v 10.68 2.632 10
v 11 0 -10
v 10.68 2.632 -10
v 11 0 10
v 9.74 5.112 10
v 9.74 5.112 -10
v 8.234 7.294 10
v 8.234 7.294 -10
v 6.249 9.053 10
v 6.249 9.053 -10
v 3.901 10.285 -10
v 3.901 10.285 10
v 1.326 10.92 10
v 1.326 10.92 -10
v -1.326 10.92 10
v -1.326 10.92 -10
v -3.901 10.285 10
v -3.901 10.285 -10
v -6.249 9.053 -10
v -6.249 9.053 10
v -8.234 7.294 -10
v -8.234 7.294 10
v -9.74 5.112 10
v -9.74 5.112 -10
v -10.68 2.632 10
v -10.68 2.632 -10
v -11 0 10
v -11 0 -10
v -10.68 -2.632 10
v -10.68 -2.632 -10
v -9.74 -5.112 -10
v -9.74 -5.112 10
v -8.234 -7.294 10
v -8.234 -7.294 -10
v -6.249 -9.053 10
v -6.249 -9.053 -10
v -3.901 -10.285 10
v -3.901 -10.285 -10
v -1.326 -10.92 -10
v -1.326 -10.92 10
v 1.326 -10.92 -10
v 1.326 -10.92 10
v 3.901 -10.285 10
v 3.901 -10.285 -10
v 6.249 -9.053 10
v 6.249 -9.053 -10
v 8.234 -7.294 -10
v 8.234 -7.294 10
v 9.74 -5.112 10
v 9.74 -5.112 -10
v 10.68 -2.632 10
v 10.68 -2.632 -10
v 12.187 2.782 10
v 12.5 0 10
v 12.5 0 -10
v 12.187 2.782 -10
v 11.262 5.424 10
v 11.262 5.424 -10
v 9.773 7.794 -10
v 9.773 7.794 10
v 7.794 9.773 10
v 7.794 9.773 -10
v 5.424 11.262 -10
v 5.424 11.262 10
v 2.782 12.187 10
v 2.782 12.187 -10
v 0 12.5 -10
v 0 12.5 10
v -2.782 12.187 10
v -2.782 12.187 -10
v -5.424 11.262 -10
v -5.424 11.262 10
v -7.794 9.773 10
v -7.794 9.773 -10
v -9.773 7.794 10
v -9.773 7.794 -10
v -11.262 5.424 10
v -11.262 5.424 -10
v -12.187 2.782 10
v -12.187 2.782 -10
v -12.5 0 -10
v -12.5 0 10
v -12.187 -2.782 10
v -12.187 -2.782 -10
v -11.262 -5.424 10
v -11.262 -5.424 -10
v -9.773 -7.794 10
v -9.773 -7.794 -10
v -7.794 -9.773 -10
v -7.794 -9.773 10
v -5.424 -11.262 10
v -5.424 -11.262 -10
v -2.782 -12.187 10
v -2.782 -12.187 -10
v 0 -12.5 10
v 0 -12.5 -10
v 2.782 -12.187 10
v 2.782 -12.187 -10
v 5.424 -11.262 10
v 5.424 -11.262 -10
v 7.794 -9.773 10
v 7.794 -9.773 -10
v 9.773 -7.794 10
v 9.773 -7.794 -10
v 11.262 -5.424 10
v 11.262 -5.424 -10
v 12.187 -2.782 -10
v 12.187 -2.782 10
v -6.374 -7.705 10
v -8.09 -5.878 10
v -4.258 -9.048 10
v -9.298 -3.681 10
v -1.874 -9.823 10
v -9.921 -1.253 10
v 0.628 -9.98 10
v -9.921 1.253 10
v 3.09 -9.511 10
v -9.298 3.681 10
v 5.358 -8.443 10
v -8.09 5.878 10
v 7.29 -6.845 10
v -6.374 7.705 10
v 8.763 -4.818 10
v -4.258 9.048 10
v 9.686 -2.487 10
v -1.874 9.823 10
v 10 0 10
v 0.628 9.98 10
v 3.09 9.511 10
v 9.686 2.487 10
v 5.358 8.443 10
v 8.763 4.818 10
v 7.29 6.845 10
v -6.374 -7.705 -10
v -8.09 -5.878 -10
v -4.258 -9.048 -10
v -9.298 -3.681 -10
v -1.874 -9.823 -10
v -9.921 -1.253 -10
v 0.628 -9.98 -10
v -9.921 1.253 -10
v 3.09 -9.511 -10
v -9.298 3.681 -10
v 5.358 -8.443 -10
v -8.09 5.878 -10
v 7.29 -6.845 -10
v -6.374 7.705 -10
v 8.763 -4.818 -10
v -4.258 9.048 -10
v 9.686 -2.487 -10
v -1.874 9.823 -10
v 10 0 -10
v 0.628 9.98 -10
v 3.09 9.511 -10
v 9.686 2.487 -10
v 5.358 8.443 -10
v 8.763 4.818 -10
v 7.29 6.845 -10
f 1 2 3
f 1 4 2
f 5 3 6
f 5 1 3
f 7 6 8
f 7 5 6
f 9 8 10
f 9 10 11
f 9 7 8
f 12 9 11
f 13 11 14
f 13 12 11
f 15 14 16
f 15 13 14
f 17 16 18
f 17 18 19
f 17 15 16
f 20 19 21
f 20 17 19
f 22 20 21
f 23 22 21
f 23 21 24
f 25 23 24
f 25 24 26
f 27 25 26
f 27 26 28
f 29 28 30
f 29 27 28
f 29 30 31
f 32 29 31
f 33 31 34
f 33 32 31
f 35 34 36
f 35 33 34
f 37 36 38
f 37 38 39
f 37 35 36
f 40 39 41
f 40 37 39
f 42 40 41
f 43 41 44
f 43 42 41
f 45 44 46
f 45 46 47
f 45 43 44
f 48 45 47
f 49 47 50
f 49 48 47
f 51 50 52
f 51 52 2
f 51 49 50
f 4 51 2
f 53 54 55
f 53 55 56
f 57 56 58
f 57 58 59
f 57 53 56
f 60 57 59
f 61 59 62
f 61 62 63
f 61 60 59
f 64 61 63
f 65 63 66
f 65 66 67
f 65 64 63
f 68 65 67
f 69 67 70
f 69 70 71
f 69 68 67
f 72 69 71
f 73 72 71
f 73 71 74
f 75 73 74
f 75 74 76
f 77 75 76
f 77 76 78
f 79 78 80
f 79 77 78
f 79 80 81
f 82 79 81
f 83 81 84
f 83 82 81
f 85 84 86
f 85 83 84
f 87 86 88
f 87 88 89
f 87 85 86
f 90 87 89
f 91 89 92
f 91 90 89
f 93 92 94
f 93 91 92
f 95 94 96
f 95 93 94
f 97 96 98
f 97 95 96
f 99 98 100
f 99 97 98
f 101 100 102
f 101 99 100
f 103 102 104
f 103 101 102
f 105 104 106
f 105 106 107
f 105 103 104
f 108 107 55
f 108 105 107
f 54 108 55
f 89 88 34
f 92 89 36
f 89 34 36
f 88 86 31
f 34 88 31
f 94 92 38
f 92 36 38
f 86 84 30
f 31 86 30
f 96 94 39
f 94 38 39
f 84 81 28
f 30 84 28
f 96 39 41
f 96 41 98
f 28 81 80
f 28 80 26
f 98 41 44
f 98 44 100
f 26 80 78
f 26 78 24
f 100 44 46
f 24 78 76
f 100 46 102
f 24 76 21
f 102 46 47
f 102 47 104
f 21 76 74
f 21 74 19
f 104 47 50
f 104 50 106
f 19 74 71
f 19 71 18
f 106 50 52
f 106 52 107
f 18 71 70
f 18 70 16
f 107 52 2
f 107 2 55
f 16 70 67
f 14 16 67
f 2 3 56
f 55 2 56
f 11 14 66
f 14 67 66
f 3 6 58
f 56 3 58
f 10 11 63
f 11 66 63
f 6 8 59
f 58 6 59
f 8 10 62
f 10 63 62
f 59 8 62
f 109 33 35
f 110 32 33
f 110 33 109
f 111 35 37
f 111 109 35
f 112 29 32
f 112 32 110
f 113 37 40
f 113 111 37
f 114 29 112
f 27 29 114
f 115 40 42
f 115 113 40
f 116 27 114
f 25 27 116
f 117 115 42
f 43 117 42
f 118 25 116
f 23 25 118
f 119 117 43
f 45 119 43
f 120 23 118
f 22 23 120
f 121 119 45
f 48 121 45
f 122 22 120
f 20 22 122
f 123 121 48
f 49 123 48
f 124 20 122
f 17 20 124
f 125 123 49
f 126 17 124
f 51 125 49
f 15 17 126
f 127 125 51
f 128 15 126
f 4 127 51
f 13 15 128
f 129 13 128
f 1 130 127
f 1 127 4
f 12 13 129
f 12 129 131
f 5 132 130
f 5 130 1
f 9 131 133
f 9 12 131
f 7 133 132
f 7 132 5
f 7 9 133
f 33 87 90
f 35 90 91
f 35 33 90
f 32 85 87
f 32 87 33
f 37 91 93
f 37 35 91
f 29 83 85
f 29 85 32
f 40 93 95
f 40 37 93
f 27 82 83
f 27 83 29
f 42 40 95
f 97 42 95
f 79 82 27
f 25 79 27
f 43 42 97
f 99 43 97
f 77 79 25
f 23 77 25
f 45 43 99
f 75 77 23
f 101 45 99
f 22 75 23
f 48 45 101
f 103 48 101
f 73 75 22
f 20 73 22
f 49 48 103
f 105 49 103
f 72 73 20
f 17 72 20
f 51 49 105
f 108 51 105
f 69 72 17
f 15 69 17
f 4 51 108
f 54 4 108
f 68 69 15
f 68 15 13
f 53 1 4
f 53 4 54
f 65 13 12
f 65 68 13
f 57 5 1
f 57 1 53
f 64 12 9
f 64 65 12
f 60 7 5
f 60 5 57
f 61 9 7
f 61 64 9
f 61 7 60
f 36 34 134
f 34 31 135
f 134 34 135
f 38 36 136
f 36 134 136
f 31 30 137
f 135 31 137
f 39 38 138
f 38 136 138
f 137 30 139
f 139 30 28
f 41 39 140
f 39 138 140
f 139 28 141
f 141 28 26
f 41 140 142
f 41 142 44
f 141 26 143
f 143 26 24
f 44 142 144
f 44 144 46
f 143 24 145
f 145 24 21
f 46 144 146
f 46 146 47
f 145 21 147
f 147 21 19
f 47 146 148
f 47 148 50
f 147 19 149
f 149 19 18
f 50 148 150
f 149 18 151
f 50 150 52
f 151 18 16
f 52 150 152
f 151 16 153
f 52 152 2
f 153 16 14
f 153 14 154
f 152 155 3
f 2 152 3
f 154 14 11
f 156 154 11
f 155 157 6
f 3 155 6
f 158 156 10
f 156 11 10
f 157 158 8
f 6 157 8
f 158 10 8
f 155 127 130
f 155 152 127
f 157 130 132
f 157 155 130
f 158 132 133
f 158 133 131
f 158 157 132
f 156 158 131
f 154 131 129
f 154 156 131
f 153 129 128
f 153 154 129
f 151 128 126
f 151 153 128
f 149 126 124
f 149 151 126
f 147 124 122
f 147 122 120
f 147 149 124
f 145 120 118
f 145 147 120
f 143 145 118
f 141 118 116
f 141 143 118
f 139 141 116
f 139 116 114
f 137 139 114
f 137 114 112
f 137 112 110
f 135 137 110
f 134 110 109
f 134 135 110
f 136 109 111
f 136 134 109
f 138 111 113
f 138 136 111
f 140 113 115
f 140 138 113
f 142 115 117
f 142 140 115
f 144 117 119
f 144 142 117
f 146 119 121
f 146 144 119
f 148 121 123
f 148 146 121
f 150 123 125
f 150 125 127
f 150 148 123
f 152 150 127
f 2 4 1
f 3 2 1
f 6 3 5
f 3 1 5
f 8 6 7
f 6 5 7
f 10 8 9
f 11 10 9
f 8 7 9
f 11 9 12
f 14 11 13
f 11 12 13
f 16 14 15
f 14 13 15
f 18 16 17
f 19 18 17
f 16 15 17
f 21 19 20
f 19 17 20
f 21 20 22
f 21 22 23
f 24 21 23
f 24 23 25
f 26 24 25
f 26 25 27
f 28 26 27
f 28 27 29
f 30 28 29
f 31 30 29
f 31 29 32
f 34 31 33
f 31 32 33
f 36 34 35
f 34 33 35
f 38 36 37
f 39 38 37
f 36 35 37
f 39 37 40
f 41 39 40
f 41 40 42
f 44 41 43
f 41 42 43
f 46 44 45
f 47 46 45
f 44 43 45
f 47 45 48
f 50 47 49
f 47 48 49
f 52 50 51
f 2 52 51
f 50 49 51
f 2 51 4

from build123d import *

# Parameters (mm, degrees)
SKETCH2_R           = 11
SKETCH2_R_2         = 10
BOSS_EXTRUDE1_DEPTH = 10
SKETCH3_R           = 12.5
SKETCH3_R_2         = 11
BOSS_EXTRUDE2_DEPTH = 20


with BuildPart() as part:
    # Sketch2 → Boss-Extrude1 (new body, symmetric)
    with BuildSketch(Plane.XY):
        Circle(SKETCH2_R)
        Circle(SKETCH2_R_2, mode=Mode.SUBTRACT)
    extrude(amount=BOSS_EXTRUDE1_DEPTH, both=True)


with BuildPart() as body_2:
    # Sketch3 → Boss-Extrude2 (new body, through all)
    with BuildSketch(Plane.XY.offset(10)):
        Circle(SKETCH3_R)
        Circle(SKETCH3_R_2, mode=Mode.SUBTRACT)
    extrude(amount=-BOSS_EXTRUDE2_DEPTH)


solid = Compound([part.part, body_2.part])
